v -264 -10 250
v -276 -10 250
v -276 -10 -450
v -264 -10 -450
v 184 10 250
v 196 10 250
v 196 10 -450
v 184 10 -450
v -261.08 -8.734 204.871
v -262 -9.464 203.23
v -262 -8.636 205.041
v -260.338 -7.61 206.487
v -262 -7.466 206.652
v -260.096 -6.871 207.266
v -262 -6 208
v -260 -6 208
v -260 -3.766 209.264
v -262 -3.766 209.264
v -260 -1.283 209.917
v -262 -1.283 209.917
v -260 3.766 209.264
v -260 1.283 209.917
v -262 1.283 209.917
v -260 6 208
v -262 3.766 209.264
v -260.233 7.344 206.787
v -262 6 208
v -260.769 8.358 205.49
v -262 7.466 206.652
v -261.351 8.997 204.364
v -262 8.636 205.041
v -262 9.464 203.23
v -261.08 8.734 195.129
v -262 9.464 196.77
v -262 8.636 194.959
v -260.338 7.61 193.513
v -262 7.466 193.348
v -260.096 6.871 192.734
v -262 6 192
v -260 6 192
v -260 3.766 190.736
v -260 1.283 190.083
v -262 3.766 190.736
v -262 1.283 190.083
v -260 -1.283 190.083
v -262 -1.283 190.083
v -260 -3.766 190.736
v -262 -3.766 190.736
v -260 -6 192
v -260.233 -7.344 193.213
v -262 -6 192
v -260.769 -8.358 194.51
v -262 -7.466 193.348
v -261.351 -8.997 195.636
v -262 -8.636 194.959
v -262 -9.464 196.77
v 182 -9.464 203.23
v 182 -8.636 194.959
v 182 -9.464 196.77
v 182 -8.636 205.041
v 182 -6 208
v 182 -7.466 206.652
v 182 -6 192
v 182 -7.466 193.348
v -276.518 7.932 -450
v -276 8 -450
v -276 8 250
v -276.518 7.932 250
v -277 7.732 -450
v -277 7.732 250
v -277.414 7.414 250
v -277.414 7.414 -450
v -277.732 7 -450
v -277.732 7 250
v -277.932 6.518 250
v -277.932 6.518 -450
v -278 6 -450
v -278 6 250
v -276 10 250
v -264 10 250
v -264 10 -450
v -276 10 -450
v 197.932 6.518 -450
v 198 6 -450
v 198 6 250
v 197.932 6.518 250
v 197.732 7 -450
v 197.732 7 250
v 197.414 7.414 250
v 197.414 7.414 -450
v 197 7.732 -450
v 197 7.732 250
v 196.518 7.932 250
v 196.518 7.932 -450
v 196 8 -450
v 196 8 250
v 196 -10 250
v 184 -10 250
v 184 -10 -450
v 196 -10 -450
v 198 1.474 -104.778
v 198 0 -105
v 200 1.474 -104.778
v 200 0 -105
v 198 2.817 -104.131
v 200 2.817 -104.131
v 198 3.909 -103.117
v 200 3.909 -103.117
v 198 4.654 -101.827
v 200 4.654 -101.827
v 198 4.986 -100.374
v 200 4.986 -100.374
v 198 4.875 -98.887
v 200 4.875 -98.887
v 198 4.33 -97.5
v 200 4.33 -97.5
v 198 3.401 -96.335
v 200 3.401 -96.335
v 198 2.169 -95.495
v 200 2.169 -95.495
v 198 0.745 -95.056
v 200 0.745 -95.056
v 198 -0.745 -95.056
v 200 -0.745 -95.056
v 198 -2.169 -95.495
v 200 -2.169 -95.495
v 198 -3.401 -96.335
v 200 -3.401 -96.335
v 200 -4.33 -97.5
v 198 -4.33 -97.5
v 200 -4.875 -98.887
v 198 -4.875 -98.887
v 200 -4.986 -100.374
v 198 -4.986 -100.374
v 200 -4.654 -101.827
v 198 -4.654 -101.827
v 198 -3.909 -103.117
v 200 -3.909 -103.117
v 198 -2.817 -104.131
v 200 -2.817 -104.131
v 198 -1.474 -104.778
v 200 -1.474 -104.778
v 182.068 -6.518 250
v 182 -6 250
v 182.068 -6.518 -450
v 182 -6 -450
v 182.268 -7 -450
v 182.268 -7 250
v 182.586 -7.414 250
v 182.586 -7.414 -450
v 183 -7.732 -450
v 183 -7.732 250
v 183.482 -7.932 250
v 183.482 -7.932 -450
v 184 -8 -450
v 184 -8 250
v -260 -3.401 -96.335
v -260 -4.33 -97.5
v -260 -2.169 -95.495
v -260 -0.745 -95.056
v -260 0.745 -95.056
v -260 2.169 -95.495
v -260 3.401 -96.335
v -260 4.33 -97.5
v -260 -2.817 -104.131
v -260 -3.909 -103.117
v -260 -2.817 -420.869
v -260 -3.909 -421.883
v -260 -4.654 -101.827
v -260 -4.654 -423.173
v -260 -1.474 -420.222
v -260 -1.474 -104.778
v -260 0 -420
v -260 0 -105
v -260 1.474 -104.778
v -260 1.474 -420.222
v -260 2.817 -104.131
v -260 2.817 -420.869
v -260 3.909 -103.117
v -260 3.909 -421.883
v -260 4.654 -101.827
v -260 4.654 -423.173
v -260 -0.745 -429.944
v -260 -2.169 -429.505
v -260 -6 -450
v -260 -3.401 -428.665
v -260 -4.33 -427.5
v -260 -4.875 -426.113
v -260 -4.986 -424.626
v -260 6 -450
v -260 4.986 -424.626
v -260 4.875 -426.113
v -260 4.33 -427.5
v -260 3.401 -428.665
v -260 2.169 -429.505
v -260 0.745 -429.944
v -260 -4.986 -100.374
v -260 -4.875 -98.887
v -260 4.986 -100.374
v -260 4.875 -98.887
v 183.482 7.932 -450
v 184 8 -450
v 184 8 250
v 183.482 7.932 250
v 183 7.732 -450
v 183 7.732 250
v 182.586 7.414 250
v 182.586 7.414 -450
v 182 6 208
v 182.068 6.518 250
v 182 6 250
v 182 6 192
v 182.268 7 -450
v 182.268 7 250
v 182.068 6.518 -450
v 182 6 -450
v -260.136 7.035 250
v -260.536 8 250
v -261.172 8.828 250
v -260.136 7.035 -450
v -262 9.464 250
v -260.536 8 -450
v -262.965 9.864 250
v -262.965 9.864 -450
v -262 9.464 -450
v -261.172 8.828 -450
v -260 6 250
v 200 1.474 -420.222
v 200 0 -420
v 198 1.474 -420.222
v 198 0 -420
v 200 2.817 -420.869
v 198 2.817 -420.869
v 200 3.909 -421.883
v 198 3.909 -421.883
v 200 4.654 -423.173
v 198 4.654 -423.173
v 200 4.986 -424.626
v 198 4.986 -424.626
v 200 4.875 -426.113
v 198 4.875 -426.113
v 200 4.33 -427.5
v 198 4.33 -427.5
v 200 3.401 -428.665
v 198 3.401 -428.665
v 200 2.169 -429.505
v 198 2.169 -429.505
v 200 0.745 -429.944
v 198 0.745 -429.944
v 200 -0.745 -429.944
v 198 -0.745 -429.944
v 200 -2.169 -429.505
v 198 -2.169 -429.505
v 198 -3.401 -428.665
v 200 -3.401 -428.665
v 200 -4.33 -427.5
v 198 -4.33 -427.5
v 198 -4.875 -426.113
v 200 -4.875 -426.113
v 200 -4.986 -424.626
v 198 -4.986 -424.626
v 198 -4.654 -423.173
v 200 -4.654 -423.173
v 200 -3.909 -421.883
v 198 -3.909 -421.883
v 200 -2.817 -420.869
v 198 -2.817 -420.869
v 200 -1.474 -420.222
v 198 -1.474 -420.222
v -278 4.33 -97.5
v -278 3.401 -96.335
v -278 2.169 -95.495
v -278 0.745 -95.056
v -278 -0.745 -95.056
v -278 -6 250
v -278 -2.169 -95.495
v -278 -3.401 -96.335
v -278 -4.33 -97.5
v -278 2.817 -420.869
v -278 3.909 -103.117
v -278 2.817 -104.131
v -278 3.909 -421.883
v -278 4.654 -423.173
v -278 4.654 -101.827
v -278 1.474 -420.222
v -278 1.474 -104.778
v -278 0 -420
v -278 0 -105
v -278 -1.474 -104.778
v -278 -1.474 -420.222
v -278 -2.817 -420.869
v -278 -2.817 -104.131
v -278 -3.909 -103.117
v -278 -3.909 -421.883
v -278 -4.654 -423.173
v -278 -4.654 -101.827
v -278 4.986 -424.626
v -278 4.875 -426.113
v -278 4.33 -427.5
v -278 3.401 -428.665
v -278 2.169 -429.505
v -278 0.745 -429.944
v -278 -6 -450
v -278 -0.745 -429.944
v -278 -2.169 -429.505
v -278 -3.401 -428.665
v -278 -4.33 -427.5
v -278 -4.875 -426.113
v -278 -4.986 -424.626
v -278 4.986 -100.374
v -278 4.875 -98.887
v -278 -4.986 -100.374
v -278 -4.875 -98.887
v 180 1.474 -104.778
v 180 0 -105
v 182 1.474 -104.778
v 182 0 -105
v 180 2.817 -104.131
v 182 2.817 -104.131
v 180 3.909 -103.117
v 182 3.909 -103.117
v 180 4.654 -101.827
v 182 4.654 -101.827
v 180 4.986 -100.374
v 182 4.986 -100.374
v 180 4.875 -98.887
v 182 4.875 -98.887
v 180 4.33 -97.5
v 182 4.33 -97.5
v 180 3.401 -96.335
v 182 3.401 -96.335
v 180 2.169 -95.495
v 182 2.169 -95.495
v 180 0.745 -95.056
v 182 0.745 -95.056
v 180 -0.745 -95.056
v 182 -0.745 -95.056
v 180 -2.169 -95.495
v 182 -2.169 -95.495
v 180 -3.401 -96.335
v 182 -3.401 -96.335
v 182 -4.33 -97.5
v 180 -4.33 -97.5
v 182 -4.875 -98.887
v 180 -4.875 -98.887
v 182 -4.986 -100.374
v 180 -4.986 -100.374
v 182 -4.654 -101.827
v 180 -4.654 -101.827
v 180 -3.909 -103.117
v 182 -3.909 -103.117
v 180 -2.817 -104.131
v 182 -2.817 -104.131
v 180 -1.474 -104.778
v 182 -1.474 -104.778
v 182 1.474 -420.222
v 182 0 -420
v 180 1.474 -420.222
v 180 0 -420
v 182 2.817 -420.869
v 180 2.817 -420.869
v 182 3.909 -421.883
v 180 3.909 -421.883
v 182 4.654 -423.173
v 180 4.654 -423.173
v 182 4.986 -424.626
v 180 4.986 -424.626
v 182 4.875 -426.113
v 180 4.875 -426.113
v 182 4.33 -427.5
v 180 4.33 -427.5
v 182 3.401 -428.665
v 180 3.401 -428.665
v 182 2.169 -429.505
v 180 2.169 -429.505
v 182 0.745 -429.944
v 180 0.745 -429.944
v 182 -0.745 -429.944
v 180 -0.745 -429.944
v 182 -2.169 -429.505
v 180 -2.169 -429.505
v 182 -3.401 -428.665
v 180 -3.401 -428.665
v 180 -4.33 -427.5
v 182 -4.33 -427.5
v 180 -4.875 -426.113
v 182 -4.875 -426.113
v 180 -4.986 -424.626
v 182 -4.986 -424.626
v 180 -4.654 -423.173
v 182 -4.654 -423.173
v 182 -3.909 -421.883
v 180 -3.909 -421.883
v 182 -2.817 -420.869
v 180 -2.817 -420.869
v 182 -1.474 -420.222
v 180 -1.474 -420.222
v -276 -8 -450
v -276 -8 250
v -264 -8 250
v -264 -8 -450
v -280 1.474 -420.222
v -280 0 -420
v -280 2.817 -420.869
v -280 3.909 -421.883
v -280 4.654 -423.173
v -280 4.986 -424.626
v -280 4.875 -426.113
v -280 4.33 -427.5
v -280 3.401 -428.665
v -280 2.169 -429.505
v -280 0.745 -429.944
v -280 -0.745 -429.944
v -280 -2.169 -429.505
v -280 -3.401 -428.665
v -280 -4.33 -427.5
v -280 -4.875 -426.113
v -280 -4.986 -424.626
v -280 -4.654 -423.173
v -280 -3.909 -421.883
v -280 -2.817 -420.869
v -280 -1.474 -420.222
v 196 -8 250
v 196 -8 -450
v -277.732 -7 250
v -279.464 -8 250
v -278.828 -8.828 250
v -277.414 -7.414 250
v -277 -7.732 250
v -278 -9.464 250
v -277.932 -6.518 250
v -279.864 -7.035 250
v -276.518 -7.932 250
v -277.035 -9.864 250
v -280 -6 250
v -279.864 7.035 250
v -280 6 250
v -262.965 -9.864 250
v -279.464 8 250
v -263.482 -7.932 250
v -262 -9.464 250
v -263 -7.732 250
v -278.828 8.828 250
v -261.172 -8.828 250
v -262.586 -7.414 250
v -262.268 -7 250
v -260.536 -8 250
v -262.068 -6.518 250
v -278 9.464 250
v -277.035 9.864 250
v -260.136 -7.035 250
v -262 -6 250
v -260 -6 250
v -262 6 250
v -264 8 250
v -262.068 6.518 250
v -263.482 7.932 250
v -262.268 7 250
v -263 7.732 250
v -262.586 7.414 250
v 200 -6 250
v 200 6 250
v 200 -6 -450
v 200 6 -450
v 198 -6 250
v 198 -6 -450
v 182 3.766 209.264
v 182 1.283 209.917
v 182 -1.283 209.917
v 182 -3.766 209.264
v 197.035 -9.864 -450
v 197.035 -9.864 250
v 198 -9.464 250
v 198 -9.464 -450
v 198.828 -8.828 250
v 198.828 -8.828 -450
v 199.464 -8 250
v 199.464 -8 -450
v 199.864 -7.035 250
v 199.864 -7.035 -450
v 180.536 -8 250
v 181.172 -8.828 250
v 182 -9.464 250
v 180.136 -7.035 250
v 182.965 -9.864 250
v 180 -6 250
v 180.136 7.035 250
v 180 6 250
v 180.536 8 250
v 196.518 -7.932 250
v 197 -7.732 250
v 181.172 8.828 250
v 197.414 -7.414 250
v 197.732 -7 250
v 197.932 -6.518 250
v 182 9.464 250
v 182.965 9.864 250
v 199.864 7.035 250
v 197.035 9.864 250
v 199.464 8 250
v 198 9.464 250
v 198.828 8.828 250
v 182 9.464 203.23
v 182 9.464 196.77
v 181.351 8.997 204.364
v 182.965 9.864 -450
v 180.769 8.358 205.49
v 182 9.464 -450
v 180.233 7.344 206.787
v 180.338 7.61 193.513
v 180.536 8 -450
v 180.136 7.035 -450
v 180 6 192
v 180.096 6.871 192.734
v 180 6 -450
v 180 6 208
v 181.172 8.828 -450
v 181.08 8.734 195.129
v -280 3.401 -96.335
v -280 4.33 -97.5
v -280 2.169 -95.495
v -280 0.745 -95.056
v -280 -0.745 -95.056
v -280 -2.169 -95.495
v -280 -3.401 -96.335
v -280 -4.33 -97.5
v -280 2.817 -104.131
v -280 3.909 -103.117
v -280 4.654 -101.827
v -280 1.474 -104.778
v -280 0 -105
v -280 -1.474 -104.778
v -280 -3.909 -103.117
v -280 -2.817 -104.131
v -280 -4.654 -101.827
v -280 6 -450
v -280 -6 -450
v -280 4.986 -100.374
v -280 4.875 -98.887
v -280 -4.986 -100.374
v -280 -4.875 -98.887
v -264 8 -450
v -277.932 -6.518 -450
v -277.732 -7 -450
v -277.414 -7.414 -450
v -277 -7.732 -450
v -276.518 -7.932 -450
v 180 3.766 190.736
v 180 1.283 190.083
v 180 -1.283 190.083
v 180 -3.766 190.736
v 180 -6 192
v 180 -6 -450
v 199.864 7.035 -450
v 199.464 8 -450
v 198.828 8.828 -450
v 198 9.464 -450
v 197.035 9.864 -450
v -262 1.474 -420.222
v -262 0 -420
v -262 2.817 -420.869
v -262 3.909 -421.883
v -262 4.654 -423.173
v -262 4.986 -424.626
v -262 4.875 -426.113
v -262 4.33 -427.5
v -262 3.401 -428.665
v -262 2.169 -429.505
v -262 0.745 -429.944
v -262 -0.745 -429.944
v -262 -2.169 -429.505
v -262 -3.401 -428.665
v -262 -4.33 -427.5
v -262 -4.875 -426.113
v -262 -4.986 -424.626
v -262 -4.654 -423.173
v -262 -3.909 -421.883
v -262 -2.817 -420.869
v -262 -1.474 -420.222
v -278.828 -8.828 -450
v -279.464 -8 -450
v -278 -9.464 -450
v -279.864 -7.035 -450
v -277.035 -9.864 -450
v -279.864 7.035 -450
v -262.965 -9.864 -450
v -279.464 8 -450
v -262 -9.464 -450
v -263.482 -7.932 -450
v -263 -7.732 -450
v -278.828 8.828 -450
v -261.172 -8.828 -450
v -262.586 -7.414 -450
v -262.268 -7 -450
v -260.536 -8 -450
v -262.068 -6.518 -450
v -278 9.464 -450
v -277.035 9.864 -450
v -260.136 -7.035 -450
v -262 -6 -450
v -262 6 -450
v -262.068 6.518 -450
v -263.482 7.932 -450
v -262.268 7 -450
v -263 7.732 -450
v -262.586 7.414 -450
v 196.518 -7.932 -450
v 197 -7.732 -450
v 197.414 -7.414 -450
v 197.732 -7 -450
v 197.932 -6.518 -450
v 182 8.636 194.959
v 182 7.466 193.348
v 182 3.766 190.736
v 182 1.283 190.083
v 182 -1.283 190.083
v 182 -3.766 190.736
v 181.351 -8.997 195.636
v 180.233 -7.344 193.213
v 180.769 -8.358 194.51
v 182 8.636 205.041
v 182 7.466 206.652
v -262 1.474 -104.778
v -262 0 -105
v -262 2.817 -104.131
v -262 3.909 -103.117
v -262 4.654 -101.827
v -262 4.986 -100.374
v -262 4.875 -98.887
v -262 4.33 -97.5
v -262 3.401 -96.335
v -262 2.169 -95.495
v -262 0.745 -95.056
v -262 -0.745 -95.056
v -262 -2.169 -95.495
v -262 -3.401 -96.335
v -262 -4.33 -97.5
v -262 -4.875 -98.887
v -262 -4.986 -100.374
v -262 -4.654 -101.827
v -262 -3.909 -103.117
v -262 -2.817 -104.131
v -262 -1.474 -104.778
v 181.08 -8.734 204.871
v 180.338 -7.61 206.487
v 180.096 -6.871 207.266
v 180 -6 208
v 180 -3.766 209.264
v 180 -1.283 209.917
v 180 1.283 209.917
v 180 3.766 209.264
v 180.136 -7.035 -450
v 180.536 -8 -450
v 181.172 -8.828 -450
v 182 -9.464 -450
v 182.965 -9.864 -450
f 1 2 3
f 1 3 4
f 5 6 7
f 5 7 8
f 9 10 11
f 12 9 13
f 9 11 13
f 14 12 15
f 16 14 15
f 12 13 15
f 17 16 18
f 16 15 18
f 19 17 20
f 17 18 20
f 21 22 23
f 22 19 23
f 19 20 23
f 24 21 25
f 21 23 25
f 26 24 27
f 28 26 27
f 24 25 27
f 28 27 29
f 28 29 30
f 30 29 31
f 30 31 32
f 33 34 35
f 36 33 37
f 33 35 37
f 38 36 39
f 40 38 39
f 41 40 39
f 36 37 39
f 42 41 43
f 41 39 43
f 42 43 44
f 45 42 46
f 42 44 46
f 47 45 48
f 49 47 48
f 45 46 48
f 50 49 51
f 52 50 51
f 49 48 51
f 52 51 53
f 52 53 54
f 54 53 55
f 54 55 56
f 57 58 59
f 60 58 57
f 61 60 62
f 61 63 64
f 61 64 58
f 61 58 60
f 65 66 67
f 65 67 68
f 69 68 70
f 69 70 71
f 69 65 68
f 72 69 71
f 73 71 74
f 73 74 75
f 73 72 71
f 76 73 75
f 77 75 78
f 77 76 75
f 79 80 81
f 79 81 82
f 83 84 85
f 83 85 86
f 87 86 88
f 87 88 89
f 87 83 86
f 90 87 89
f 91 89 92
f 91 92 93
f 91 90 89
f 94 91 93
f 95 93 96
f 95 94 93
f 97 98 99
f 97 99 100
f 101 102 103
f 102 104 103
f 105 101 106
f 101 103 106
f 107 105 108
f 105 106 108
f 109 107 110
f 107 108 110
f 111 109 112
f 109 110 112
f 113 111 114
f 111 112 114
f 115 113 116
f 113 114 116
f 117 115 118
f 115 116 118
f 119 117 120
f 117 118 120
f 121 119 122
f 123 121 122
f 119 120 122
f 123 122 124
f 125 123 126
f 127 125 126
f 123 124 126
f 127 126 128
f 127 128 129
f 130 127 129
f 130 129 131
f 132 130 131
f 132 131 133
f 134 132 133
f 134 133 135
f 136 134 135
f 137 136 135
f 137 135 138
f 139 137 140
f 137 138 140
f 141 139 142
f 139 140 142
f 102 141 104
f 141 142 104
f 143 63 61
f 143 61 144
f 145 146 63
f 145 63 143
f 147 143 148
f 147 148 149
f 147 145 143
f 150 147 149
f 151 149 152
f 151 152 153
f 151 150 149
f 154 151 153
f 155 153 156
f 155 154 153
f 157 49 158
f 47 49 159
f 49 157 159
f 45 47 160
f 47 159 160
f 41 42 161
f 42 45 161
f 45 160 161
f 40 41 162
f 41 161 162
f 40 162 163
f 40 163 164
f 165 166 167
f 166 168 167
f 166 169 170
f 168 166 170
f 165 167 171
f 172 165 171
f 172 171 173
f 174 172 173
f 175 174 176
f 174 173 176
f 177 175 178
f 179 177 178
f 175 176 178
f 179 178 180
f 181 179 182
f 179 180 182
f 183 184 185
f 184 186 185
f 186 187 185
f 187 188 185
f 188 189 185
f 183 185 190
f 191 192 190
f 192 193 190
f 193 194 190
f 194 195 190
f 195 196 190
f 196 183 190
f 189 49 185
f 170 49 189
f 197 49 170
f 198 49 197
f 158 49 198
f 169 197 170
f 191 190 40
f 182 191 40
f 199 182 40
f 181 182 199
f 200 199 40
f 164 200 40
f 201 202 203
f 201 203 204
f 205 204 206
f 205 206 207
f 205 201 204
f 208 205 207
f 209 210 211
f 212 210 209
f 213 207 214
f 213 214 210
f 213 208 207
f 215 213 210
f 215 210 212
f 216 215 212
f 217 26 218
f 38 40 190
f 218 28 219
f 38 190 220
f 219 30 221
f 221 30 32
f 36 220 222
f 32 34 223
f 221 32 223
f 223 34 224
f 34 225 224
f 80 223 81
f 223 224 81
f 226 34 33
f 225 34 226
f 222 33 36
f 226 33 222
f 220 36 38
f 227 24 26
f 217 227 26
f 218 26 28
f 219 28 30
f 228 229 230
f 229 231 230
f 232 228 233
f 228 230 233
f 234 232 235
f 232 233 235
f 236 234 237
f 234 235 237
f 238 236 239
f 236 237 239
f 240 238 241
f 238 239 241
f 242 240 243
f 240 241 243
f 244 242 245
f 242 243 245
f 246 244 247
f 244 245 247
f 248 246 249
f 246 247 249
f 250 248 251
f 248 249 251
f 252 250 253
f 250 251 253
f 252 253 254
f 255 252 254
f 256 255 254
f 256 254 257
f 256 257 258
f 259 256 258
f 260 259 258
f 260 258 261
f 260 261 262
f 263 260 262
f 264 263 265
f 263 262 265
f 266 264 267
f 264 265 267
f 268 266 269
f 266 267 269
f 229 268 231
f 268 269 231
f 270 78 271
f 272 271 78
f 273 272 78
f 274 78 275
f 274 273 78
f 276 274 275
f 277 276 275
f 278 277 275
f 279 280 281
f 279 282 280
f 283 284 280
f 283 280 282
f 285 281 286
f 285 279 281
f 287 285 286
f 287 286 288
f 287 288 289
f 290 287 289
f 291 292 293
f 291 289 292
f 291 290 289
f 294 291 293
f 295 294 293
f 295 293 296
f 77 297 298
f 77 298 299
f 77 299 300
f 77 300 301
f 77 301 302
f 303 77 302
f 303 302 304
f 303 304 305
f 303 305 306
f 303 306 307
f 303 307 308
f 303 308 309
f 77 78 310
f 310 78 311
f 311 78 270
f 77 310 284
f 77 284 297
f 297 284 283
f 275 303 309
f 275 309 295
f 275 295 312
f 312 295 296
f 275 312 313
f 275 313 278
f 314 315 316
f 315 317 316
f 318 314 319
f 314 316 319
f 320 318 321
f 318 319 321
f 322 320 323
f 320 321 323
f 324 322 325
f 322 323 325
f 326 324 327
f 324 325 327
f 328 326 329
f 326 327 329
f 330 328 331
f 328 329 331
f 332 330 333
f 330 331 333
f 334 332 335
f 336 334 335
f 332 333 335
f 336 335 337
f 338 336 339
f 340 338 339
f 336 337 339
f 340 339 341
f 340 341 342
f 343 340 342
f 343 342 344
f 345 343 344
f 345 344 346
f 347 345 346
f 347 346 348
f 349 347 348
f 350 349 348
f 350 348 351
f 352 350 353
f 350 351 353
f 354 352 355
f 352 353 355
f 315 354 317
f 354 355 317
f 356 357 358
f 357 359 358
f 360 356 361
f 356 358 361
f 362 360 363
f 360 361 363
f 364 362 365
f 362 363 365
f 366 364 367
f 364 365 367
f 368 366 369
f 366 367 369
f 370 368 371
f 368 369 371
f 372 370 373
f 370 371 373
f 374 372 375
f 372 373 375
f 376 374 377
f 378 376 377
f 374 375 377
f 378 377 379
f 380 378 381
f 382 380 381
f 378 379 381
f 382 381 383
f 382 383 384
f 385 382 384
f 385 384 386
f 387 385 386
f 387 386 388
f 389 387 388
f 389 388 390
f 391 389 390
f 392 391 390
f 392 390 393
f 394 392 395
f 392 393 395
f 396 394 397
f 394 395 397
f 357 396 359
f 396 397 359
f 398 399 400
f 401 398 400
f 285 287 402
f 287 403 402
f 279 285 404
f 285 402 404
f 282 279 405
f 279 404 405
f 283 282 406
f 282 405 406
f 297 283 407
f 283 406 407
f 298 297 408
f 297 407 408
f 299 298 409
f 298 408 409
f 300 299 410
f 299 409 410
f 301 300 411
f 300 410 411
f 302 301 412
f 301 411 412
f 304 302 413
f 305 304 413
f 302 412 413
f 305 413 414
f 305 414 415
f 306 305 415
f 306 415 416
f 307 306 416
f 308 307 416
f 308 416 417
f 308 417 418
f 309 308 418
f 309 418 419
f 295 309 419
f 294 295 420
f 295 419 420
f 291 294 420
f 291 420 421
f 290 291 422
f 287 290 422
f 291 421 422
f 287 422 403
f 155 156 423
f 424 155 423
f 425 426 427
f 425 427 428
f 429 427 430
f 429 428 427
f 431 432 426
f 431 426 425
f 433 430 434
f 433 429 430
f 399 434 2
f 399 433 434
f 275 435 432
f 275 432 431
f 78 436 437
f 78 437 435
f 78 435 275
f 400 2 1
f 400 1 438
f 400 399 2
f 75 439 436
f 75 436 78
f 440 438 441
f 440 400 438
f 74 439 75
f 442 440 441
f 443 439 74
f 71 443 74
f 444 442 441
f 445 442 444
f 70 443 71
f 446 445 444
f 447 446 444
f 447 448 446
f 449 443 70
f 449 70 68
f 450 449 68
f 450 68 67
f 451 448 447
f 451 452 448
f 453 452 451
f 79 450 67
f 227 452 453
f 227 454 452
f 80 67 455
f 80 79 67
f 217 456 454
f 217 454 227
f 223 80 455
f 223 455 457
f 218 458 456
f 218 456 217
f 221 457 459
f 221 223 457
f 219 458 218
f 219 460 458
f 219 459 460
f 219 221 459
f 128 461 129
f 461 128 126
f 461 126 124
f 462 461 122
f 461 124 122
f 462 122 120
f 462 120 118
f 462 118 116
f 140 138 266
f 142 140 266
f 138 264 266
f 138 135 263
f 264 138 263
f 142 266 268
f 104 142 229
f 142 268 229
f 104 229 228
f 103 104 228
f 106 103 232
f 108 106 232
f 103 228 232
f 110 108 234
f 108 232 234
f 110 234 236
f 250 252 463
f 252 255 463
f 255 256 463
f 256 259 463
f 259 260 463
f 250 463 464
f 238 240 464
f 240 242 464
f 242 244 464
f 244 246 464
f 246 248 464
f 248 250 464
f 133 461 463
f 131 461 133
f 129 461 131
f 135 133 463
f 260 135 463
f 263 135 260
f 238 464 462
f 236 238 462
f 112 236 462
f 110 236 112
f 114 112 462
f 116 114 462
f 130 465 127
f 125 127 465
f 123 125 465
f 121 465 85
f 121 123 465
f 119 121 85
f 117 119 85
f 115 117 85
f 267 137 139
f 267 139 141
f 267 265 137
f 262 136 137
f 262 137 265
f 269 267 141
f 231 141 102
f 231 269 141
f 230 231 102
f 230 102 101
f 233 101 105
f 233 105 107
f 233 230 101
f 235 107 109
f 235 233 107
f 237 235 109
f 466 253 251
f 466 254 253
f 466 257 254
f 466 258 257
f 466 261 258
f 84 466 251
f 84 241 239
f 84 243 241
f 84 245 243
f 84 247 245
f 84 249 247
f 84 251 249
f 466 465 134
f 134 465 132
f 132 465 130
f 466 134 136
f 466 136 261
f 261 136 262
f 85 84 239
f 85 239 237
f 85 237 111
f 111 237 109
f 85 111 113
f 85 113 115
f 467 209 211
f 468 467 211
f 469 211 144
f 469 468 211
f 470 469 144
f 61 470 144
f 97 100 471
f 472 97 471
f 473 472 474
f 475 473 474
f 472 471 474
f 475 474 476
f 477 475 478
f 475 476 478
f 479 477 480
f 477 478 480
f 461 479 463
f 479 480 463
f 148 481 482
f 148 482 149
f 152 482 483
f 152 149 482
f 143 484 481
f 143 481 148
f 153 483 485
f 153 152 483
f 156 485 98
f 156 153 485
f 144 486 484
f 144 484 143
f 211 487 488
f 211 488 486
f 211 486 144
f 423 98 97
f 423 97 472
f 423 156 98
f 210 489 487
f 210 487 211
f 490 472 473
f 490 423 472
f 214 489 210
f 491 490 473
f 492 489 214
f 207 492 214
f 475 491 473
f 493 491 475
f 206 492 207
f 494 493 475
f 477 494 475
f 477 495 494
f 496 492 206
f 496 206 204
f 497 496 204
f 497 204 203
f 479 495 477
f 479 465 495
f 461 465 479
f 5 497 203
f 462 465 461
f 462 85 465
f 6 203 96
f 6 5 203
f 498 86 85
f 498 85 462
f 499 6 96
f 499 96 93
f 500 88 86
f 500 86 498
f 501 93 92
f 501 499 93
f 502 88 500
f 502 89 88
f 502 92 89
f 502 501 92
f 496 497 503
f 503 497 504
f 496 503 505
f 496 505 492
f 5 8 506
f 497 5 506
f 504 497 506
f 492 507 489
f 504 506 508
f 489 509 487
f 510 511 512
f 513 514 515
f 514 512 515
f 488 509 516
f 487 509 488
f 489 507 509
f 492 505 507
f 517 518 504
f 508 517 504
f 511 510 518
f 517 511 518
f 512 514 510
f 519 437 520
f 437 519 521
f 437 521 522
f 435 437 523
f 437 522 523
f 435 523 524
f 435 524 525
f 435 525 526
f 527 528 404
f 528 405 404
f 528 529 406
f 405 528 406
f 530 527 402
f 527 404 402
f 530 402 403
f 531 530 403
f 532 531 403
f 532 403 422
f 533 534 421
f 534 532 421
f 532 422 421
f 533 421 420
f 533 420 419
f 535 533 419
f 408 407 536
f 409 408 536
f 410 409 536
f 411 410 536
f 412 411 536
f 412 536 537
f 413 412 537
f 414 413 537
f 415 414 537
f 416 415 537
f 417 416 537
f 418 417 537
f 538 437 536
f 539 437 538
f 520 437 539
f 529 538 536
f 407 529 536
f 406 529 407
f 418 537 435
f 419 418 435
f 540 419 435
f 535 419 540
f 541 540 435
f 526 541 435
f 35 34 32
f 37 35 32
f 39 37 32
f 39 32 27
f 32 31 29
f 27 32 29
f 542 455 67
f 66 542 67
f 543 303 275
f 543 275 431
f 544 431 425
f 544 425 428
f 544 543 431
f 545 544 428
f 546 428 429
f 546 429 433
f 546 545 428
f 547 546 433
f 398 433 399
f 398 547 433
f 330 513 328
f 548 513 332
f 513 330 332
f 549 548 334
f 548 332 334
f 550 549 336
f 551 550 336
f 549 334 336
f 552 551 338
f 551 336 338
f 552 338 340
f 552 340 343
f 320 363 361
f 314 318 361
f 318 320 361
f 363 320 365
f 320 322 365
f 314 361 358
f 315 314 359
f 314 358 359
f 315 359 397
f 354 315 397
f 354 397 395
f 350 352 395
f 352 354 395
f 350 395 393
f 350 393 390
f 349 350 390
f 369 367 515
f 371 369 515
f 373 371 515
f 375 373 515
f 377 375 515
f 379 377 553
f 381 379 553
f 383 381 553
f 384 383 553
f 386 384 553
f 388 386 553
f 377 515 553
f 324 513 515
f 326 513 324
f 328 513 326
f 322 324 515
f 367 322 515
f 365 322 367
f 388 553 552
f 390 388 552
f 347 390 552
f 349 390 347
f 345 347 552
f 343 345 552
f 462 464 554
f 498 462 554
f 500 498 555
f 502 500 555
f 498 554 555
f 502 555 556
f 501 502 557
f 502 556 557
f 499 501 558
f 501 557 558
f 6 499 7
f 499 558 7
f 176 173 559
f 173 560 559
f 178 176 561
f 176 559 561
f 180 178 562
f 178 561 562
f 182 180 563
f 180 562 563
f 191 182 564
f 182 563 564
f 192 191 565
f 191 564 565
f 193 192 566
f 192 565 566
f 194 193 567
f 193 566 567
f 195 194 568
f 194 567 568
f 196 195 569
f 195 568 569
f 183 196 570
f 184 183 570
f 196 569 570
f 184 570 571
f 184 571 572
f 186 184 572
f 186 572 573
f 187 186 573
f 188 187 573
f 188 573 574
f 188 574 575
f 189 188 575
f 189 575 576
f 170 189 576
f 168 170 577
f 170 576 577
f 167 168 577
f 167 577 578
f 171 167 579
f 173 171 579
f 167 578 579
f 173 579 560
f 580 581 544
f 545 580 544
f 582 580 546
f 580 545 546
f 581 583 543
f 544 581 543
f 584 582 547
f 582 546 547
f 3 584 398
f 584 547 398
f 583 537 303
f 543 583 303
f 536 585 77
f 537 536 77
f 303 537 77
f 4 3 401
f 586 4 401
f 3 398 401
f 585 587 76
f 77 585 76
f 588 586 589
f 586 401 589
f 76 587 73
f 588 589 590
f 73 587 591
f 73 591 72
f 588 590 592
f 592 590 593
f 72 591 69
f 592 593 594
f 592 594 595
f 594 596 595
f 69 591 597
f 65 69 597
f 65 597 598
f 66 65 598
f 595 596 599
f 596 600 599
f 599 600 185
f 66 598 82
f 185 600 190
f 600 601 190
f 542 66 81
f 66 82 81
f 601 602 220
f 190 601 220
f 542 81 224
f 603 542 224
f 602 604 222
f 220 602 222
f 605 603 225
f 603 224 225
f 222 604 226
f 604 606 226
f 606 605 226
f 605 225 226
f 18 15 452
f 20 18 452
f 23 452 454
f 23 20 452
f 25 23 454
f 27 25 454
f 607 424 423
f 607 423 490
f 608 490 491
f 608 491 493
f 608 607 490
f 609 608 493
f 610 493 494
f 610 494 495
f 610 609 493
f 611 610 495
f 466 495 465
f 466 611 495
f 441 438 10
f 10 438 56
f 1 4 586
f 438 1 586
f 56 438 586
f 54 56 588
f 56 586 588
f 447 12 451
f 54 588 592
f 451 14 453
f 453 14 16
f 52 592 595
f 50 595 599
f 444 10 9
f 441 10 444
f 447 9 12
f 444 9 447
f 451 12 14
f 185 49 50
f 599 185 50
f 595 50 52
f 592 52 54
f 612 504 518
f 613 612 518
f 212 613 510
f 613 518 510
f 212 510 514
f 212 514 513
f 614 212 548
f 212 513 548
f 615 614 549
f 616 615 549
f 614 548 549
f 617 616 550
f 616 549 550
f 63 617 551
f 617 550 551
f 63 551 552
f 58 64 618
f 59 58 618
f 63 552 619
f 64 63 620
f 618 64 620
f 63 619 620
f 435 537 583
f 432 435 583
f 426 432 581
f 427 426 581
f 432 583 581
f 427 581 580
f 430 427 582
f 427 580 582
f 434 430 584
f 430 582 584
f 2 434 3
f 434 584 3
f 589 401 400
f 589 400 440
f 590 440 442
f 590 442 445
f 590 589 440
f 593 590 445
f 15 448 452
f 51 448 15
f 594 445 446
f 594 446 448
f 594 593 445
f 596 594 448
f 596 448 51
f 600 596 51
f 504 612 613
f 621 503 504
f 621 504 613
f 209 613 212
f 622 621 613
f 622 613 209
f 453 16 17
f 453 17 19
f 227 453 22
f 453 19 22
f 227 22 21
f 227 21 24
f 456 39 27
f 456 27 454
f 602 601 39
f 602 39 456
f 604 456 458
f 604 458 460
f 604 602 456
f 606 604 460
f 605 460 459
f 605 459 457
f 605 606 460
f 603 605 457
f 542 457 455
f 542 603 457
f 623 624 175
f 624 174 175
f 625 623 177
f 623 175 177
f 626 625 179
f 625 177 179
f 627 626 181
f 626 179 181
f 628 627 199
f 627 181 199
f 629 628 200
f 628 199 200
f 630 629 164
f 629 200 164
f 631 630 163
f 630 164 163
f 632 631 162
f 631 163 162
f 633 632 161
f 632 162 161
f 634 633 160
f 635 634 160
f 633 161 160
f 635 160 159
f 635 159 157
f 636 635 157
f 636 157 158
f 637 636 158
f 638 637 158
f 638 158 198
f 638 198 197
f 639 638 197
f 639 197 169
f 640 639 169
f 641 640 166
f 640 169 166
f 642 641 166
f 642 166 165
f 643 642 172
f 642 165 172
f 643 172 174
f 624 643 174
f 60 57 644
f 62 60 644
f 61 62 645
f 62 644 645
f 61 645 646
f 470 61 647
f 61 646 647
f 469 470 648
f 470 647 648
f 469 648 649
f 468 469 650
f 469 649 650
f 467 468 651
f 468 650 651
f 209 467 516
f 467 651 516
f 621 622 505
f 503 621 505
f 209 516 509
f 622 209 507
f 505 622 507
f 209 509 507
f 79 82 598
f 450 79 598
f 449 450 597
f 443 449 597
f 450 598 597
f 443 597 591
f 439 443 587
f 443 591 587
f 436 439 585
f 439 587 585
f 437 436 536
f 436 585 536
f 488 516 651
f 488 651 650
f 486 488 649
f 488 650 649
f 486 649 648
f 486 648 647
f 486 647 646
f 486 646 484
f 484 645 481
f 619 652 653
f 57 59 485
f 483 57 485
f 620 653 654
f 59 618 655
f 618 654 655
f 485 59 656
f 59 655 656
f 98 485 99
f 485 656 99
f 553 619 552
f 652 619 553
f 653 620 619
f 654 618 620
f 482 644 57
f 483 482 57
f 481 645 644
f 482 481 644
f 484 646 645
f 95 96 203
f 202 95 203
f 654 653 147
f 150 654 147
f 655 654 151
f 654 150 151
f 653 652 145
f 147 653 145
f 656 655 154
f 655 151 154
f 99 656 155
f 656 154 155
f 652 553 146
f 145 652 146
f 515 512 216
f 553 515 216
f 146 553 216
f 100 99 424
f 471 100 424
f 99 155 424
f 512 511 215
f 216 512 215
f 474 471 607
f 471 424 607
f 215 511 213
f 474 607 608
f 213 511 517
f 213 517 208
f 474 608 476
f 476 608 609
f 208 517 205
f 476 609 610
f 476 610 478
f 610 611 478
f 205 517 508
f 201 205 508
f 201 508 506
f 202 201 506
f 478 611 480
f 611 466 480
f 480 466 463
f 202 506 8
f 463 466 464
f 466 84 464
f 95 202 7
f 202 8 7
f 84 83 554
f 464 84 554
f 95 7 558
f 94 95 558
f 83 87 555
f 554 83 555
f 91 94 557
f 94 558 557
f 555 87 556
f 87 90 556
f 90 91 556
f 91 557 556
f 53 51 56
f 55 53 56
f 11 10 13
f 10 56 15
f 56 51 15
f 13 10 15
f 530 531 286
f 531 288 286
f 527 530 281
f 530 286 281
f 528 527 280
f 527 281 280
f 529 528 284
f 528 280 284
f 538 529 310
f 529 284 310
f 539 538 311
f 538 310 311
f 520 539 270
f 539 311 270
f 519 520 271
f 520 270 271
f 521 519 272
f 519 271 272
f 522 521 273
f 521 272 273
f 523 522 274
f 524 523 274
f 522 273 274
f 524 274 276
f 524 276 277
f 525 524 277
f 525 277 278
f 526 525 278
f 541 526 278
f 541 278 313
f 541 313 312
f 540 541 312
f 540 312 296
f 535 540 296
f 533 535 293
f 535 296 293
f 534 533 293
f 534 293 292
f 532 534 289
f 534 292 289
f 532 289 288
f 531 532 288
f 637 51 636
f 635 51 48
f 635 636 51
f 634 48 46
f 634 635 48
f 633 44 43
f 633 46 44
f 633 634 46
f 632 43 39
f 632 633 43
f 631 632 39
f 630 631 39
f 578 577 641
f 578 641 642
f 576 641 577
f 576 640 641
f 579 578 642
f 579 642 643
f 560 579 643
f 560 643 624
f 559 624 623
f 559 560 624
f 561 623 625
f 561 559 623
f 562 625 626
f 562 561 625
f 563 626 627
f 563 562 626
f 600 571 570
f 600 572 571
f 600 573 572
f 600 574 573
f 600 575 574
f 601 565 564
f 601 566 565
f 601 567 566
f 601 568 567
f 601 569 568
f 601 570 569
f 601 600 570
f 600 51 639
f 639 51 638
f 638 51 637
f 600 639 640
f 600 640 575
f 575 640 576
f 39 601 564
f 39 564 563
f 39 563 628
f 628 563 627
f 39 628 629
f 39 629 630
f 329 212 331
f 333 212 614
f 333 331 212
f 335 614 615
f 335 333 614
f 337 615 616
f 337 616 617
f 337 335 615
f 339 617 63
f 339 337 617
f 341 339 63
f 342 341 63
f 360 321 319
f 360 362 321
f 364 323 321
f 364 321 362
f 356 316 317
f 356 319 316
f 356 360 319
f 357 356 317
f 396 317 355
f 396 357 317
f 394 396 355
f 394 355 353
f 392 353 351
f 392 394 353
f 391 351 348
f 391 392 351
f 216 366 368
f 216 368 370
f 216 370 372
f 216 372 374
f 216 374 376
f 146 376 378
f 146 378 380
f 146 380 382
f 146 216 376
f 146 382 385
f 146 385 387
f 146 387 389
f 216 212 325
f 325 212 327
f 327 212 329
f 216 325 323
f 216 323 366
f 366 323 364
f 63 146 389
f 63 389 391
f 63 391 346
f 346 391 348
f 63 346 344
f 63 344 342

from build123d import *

# Parameters (mm, degrees)
SQUARE_TUBE_CONFIGURED_20_X_20_X_2_1_DEPTH   = 700
SQUARE_TUBE_CONFIGURED_20_X_20_X_2_1_2_DEPTH = 700
SKETCH15_R                                   = 5
CUT_EXTRUDE1_DEPTH                           = 531.094331228
CUT_EXTRUDE1_DEPTH_BACK                      = 531.094331228
SKETCH18_R                                   = 5
CUT_EXTRUDE2_DEPTH                           = 644.583716388
CUT_EXTRUDE2_DEPTH_BACK                      = 644.583716388
SKETCH13_R                                   = 10
CUT_EXTRUDE3_DEPTH                           = 442
CUT_EXTRUDE3_DEPTH_BACK                      = 2


with BuildPart() as part:
    # Sketch17 → Square tube - configured 20 X 20 X 2(1) (new body)
    with BuildSketch(Plane(origin=(-270, 0, -450), x_dir=(1, 0, 0), z_dir=(0, 0, 1))):
        with BuildLine():
            Line((-6, -10), (6, -10))
            ThreePointArc((6, -10), (8.828427125, -8.828427125), (10, -6))
            Line((10, -6), (10, 6))
            ThreePointArc((10, 6), (8.828427125, 8.828427125), (6, 10))
            Line((6, 10), (-6, 10))
            ThreePointArc((-6, 10), (-8.828427125, 8.828427125), (-10, 6))
            Line((-10, 6), (-10, -6))
            ThreePointArc((-10, -6), (-8.828427125, -8.828427125), (-6, -10))
        make_face()
        with BuildLine():
            Line((-6, -8), (6, -8))
            ThreePointArc((6, -8), (7.414213562, -7.414213562), (8, -6))
            Line((8, -6), (8, 6))
            ThreePointArc((8, 6), (7.414213562, 7.414213562), (6, 8))
            Line((6, 8), (-6, 8))
            ThreePointArc((-6, 8), (-7.414213562, 7.414213562), (-8, 6))
            Line((-8, 6), (-8, -6))
            ThreePointArc((-8, -6), (-7.414213562, -7.414213562), (-6, -8))
        make_face(mode=Mode.SUBTRACT)
    extrude(amount=SQUARE_TUBE_CONFIGURED_20_X_20_X_2_1_DEPTH)


with BuildPart() as body_2:
    # Sketch17 on segment 2 (carried to segment 2) → Square tube - configured 20 X 20 X 2_1 2 (new body)
    with BuildSketch(Plane(origin=(190, 0, -450), x_dir=(1, 0, 0), z_dir=(0, 0, 1))):
        with BuildLine():
            Line((-6, -10), (6, -10))
            ThreePointArc((6, -10), (8.828427125, -8.828427125), (10, -6))
            Line((10, -6), (10, 6))
            ThreePointArc((10, 6), (8.828427125, 8.828427125), (6, 10))
            Line((6, 10), (-6, 10))
            ThreePointArc((-6, 10), (-8.828427125, 8.828427125), (-10, 6))
            Line((-10, 6), (-10, -6))
            ThreePointArc((-10, -6), (-8.828427125, -8.828427125), (-6, -10))
        make_face()
        with BuildLine():
            Line((-6, -8), (6, -8))
            ThreePointArc((6, -8), (7.414213562, -7.414213562), (8, -6))
            Line((8, -6), (8, 6))
            ThreePointArc((8, 6), (7.414213562, 7.414213562), (6, 8))
            Line((6, 8), (-6, 8))
            ThreePointArc((-6, 8), (-7.414213562, 7.414213562), (-8, 6))
            Line((-8, 6), (-8, -6))
            ThreePointArc((-8, -6), (-7.414213562, -7.414213562), (-6, -8))
        make_face(mode=Mode.SUBTRACT)
    extrude(amount=SQUARE_TUBE_CONFIGURED_20_X_20_X_2_1_2_DEPTH)


with BuildPart() as cut_extrude1_tool:
    # Sketch15 → Cut-Extrude1 (new, two sides)
    with BuildSketch(Plane(origin=(0, 0, 0), x_dir=(0, 0, -1), z_dir=(1, 0, 0))) as cut_extrude1_sk:
        with Locations((100, 0)):
            Circle(SKETCH15_R)
    extrude(amount=CUT_EXTRUDE1_DEPTH)
    extrude(cut_extrude1_sk.sketch, amount=-CUT_EXTRUDE1_DEPTH_BACK)


with BuildPart() as part_1:
    add(part.part)

    # Cut-Extrude1: cut by cut_extrude1_tool
    add(cut_extrude1_tool.part, mode=Mode.SUBTRACT)


with BuildPart() as body_2_1:
    add(body_2.part)

    # Cut-Extrude1: cut by cut_extrude1_tool
    add(cut_extrude1_tool.part, mode=Mode.SUBTRACT)


with BuildPart() as cut_extrude2_tool:
    # Sketch18 → Cut-Extrude2 (new, two sides)
    with BuildSketch(Plane.ZY.offset(-180)) as cut_extrude2_sk:
        with Locations((-425, 0)):
            Circle(SKETCH18_R)
    extrude(amount=CUT_EXTRUDE2_DEPTH)
    extrude(cut_extrude2_sk.sketch, amount=-CUT_EXTRUDE2_DEPTH_BACK)


with BuildPart() as part_2:
    add(part_1.part)

    # Cut-Extrude2: cut by cut_extrude2_tool
    add(cut_extrude2_tool.part, mode=Mode.SUBTRACT)


with BuildPart() as body_2_2:
    add(body_2_1.part)

    # Cut-Extrude2: cut by cut_extrude2_tool
    add(cut_extrude2_tool.part, mode=Mode.SUBTRACT)


with BuildPart() as cut_extrude3_tool:
    # Sketch13 → Cut-Extrude3 (new, two sides)
    with BuildSketch(Plane.ZY.offset(-180)) as cut_extrude3_sk:
        with Locations((200, 0)):
            Circle(SKETCH13_R)
    extrude(amount=CUT_EXTRUDE3_DEPTH)
    extrude(cut_extrude3_sk.sketch, amount=-CUT_EXTRUDE3_DEPTH_BACK)


with BuildPart() as part_3:
    add(part_2.part)

    # Cut-Extrude3: cut by cut_extrude3_tool
    add(cut_extrude3_tool.part, mode=Mode.SUBTRACT)


with BuildPart() as body_2_3:
    add(body_2_2.part)

    # Cut-Extrude3: cut by cut_extrude3_tool
    add(cut_extrude3_tool.part, mode=Mode.SUBTRACT)


solid = Compound([part_3.part, body_2_3.part])
